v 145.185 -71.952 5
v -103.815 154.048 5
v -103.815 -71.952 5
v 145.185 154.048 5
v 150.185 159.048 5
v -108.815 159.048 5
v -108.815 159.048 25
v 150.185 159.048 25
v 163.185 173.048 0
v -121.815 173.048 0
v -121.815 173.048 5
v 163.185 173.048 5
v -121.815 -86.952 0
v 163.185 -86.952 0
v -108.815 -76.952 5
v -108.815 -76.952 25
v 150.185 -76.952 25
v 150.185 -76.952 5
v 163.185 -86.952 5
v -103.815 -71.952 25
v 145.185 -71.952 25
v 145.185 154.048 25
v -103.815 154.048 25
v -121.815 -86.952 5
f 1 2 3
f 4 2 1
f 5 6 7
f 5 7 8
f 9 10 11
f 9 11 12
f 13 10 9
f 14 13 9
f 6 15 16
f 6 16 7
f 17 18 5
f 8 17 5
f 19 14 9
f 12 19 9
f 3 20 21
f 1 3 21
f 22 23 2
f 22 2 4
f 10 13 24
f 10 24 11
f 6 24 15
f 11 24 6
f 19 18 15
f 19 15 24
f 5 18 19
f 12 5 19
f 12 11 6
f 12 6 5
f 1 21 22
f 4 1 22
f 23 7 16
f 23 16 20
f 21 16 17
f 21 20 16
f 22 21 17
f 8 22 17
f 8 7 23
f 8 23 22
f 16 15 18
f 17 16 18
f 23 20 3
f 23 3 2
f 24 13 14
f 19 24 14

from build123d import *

# Parameters (mm, degrees)
SKETCH1_W           = 285
SKETCH1_H           = 260
BOSS_EXTRUDE3_DEPTH = 5
SKETCH3_W           = 259
SKETCH3_H           = 236
BOSS_EXTRUDE4_DEPTH = 20
SKETCH4_W           = 249
SKETCH4_H           = 226
CUT_EXTRUDE1_DEPTH  = 20


with BuildPart() as part:
    # Sketch1 → Boss-Extrude3 (new body)
    with BuildSketch(Plane.XY):
        with Locations((20.685479664, 43.047709924)):
            Rectangle(SKETCH1_W, SKETCH1_H)
    extrude(amount=BOSS_EXTRUDE3_DEPTH)

    # Sketch3 → Boss-Extrude4 (add)
    with BuildSketch(Plane.XY.offset(5)):
        with Locations((20.685479664, 41.047709924)):
            Rectangle(SKETCH3_W, SKETCH3_H)
    extrude(amount=BOSS_EXTRUDE4_DEPTH)

    # Sketch4 → Cut-Extrude1 (cut)
    with BuildSketch(Plane.XY.offset(25)):
        with Locations((20.685479664, 41.047709924)):
            Rectangle(SKETCH4_W, SKETCH4_H)
    extrude(amount=-CUT_EXTRUDE1_DEPTH, mode=Mode.SUBTRACT)


solid = part.part
